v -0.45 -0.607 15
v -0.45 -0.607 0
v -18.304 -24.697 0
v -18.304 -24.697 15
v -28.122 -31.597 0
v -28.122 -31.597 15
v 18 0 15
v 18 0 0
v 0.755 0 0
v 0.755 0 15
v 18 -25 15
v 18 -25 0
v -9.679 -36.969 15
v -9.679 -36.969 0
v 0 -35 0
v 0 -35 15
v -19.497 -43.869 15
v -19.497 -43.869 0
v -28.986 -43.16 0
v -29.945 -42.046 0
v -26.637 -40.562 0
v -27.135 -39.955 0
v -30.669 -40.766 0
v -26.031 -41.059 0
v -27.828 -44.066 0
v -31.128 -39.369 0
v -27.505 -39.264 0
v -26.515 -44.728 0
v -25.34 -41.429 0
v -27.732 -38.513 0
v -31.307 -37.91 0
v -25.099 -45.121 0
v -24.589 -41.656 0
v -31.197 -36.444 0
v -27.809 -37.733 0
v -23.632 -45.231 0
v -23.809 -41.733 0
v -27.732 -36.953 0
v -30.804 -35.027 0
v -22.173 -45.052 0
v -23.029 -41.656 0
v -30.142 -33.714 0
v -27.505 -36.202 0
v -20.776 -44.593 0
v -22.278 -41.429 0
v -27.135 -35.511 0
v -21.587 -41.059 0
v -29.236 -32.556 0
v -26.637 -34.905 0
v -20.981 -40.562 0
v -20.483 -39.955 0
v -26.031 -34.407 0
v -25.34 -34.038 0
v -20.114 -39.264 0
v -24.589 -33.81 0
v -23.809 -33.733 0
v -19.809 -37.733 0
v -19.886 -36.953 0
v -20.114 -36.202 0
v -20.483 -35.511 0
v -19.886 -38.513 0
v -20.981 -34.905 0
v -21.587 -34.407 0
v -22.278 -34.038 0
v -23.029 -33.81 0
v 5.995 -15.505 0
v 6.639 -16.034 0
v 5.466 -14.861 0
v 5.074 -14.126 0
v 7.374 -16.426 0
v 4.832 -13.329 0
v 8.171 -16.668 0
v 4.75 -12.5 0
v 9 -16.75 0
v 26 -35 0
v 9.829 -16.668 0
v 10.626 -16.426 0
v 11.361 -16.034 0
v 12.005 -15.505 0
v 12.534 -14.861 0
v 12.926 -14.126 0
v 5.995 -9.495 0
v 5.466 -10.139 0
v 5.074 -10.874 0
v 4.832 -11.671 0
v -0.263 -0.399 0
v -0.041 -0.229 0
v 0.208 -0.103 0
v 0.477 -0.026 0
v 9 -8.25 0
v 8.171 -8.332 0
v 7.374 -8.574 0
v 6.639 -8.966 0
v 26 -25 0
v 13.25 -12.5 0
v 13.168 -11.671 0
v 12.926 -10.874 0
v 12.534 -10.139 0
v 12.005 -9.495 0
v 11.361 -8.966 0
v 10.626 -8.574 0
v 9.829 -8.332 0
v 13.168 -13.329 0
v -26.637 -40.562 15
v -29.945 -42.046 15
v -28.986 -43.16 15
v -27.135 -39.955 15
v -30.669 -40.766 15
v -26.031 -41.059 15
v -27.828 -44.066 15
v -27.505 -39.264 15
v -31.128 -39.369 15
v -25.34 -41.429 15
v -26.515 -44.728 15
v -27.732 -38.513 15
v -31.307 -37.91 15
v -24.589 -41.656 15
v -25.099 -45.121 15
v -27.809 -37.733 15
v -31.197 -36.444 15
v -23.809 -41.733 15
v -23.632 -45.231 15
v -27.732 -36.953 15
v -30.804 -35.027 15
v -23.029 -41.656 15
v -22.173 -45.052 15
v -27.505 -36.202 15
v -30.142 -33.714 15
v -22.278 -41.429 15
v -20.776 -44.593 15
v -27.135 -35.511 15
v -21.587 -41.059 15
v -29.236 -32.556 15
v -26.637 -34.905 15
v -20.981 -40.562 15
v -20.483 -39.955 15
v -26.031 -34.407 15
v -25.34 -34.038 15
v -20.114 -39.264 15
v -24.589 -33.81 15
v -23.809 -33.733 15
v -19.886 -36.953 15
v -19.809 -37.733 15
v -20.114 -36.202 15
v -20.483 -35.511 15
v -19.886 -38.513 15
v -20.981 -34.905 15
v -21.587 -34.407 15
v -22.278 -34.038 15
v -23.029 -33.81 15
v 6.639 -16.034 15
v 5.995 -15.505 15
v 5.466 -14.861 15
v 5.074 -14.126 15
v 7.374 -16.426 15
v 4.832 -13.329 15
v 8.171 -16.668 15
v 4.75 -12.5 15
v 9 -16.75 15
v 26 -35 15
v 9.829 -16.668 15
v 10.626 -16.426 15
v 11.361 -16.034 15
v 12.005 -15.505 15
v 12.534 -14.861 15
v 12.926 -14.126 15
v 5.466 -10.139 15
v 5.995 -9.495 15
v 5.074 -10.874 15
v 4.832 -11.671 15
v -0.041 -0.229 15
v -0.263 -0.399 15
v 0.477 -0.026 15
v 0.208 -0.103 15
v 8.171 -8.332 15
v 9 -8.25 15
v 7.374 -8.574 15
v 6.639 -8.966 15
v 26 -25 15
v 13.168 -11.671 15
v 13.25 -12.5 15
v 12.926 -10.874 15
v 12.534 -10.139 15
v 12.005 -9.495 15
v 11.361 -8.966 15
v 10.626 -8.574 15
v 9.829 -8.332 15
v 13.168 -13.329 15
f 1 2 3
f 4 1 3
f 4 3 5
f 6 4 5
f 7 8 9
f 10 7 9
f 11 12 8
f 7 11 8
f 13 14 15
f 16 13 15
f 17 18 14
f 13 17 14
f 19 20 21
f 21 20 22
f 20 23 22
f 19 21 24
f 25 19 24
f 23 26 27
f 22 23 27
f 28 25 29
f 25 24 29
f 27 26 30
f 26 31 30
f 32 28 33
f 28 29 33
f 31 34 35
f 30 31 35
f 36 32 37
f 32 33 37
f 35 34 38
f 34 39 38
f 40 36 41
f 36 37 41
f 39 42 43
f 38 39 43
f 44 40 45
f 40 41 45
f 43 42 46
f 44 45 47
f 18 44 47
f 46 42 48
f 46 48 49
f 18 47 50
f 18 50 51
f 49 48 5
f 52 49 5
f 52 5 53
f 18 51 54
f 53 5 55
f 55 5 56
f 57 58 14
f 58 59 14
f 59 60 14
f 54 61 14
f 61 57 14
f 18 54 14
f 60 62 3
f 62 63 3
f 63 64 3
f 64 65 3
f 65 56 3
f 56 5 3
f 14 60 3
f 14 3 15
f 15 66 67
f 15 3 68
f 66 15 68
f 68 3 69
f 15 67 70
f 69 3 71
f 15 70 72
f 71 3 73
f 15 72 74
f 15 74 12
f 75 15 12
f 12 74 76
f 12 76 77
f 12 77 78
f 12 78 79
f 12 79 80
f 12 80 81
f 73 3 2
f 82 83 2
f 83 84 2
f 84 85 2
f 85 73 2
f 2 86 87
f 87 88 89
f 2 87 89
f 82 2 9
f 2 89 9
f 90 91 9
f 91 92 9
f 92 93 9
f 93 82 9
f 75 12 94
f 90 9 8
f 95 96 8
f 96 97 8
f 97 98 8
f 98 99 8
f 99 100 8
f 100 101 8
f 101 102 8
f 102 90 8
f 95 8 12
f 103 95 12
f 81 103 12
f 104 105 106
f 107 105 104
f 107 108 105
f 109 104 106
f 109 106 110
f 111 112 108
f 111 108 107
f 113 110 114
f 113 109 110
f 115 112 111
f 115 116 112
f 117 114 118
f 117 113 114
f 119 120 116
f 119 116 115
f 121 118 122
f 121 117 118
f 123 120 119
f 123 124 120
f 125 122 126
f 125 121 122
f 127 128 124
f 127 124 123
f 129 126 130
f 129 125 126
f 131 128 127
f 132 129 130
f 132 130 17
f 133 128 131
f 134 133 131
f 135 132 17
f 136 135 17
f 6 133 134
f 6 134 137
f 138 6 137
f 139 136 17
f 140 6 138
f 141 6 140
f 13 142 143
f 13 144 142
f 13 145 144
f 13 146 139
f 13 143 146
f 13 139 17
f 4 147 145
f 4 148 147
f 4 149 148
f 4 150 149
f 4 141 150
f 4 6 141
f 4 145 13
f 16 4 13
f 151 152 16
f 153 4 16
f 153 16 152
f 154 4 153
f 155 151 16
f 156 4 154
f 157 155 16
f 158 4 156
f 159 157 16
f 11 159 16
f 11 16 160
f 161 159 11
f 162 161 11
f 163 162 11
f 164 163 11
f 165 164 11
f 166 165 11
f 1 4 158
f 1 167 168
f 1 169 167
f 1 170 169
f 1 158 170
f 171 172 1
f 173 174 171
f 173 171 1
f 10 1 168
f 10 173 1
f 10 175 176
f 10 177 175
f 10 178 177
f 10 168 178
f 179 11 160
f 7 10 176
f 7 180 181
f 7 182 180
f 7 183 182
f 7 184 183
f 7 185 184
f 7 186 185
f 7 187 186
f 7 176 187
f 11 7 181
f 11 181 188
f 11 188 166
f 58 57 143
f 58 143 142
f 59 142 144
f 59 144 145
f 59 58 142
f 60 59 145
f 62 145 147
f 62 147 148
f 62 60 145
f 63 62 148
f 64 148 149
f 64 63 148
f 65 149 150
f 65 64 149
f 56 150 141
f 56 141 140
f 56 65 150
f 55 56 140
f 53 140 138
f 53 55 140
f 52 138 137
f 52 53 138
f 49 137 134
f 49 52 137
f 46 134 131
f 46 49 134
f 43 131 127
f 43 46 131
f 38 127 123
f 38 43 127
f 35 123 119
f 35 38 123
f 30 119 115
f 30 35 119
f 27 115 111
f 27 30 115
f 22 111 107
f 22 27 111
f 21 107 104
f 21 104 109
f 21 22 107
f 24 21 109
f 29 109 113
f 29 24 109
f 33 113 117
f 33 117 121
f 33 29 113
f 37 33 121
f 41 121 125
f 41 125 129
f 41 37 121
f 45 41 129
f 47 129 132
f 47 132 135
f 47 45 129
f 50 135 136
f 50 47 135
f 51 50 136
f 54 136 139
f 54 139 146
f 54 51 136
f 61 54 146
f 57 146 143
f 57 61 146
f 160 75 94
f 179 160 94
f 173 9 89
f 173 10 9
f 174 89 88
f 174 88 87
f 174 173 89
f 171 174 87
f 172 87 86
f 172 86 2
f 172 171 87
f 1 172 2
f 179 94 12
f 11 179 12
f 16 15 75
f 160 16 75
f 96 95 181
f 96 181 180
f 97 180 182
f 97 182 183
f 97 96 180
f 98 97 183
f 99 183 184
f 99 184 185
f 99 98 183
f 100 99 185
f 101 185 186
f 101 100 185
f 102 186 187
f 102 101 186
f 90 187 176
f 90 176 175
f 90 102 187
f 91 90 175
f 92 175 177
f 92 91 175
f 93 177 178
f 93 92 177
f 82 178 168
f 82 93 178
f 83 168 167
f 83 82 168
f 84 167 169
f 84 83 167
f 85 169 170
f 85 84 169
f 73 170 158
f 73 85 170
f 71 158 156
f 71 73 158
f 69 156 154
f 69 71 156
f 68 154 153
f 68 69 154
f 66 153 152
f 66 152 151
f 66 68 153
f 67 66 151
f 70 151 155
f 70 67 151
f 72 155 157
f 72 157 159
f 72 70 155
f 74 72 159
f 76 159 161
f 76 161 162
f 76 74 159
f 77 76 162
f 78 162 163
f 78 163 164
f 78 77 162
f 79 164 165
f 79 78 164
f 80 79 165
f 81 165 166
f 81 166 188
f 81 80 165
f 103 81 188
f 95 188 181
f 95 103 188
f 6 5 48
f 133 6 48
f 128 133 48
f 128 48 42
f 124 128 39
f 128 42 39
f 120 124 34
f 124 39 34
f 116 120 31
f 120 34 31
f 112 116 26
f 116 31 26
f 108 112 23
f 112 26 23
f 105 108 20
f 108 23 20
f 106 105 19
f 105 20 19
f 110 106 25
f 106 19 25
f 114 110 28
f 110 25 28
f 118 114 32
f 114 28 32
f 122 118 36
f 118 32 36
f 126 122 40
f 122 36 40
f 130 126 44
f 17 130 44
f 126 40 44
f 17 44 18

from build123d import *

# Parameters (mm, degrees)
SKETCH2_R           = 4.25
SKETCH2_R_2         = 4
BOSS_EXTRUDE1_DEPTH = 15
FILLET1_R           = 1.5


with BuildPart() as part:
    # Sketch2 → Boss-Extrude1 (new body)
    with BuildSketch(Plane.XY):
        with BuildLine():
            Line((0, -35), (26, -35))
            Line((26, -35), (26, -25))
            Line((26, -25), (18, -25))
            Line((18, -25), (18, 0))
            Line((18, 0), (0, 0))
            Line((0, 0), (-18.303795088, -24.696911327))
            Line((-18.303795088, -24.696911327), (-28.121591697, -31.596974351))
            ThreePointArc((-28.121591697, -31.596974351), (-29.945175188, -42.045636622), (-19.496512917, -43.869220113))
            Line((-19.496512917, -43.869220113), (-9.678716308, -36.969157088))
            Line((-9.678716308, -36.969157088), (0, -35))
        make_face()
        with Locations((9, -12.5)):
            Circle(SKETCH2_R, mode=Mode.SUBTRACT)
        with Locations((-23.809052307, -37.733097232)):
            Circle(SKETCH2_R_2, mode=Mode.SUBTRACT)
    extrude(amount=BOSS_EXTRUDE1_DEPTH)

    # Fillet1
    fillet1_edges = [part.edges().sort_by_distance(p)[0] for p in [
        (0, 0, 7.5),
    ]]
    fillet(fillet1_edges, radius=FILLET1_R)


solid = part.part
